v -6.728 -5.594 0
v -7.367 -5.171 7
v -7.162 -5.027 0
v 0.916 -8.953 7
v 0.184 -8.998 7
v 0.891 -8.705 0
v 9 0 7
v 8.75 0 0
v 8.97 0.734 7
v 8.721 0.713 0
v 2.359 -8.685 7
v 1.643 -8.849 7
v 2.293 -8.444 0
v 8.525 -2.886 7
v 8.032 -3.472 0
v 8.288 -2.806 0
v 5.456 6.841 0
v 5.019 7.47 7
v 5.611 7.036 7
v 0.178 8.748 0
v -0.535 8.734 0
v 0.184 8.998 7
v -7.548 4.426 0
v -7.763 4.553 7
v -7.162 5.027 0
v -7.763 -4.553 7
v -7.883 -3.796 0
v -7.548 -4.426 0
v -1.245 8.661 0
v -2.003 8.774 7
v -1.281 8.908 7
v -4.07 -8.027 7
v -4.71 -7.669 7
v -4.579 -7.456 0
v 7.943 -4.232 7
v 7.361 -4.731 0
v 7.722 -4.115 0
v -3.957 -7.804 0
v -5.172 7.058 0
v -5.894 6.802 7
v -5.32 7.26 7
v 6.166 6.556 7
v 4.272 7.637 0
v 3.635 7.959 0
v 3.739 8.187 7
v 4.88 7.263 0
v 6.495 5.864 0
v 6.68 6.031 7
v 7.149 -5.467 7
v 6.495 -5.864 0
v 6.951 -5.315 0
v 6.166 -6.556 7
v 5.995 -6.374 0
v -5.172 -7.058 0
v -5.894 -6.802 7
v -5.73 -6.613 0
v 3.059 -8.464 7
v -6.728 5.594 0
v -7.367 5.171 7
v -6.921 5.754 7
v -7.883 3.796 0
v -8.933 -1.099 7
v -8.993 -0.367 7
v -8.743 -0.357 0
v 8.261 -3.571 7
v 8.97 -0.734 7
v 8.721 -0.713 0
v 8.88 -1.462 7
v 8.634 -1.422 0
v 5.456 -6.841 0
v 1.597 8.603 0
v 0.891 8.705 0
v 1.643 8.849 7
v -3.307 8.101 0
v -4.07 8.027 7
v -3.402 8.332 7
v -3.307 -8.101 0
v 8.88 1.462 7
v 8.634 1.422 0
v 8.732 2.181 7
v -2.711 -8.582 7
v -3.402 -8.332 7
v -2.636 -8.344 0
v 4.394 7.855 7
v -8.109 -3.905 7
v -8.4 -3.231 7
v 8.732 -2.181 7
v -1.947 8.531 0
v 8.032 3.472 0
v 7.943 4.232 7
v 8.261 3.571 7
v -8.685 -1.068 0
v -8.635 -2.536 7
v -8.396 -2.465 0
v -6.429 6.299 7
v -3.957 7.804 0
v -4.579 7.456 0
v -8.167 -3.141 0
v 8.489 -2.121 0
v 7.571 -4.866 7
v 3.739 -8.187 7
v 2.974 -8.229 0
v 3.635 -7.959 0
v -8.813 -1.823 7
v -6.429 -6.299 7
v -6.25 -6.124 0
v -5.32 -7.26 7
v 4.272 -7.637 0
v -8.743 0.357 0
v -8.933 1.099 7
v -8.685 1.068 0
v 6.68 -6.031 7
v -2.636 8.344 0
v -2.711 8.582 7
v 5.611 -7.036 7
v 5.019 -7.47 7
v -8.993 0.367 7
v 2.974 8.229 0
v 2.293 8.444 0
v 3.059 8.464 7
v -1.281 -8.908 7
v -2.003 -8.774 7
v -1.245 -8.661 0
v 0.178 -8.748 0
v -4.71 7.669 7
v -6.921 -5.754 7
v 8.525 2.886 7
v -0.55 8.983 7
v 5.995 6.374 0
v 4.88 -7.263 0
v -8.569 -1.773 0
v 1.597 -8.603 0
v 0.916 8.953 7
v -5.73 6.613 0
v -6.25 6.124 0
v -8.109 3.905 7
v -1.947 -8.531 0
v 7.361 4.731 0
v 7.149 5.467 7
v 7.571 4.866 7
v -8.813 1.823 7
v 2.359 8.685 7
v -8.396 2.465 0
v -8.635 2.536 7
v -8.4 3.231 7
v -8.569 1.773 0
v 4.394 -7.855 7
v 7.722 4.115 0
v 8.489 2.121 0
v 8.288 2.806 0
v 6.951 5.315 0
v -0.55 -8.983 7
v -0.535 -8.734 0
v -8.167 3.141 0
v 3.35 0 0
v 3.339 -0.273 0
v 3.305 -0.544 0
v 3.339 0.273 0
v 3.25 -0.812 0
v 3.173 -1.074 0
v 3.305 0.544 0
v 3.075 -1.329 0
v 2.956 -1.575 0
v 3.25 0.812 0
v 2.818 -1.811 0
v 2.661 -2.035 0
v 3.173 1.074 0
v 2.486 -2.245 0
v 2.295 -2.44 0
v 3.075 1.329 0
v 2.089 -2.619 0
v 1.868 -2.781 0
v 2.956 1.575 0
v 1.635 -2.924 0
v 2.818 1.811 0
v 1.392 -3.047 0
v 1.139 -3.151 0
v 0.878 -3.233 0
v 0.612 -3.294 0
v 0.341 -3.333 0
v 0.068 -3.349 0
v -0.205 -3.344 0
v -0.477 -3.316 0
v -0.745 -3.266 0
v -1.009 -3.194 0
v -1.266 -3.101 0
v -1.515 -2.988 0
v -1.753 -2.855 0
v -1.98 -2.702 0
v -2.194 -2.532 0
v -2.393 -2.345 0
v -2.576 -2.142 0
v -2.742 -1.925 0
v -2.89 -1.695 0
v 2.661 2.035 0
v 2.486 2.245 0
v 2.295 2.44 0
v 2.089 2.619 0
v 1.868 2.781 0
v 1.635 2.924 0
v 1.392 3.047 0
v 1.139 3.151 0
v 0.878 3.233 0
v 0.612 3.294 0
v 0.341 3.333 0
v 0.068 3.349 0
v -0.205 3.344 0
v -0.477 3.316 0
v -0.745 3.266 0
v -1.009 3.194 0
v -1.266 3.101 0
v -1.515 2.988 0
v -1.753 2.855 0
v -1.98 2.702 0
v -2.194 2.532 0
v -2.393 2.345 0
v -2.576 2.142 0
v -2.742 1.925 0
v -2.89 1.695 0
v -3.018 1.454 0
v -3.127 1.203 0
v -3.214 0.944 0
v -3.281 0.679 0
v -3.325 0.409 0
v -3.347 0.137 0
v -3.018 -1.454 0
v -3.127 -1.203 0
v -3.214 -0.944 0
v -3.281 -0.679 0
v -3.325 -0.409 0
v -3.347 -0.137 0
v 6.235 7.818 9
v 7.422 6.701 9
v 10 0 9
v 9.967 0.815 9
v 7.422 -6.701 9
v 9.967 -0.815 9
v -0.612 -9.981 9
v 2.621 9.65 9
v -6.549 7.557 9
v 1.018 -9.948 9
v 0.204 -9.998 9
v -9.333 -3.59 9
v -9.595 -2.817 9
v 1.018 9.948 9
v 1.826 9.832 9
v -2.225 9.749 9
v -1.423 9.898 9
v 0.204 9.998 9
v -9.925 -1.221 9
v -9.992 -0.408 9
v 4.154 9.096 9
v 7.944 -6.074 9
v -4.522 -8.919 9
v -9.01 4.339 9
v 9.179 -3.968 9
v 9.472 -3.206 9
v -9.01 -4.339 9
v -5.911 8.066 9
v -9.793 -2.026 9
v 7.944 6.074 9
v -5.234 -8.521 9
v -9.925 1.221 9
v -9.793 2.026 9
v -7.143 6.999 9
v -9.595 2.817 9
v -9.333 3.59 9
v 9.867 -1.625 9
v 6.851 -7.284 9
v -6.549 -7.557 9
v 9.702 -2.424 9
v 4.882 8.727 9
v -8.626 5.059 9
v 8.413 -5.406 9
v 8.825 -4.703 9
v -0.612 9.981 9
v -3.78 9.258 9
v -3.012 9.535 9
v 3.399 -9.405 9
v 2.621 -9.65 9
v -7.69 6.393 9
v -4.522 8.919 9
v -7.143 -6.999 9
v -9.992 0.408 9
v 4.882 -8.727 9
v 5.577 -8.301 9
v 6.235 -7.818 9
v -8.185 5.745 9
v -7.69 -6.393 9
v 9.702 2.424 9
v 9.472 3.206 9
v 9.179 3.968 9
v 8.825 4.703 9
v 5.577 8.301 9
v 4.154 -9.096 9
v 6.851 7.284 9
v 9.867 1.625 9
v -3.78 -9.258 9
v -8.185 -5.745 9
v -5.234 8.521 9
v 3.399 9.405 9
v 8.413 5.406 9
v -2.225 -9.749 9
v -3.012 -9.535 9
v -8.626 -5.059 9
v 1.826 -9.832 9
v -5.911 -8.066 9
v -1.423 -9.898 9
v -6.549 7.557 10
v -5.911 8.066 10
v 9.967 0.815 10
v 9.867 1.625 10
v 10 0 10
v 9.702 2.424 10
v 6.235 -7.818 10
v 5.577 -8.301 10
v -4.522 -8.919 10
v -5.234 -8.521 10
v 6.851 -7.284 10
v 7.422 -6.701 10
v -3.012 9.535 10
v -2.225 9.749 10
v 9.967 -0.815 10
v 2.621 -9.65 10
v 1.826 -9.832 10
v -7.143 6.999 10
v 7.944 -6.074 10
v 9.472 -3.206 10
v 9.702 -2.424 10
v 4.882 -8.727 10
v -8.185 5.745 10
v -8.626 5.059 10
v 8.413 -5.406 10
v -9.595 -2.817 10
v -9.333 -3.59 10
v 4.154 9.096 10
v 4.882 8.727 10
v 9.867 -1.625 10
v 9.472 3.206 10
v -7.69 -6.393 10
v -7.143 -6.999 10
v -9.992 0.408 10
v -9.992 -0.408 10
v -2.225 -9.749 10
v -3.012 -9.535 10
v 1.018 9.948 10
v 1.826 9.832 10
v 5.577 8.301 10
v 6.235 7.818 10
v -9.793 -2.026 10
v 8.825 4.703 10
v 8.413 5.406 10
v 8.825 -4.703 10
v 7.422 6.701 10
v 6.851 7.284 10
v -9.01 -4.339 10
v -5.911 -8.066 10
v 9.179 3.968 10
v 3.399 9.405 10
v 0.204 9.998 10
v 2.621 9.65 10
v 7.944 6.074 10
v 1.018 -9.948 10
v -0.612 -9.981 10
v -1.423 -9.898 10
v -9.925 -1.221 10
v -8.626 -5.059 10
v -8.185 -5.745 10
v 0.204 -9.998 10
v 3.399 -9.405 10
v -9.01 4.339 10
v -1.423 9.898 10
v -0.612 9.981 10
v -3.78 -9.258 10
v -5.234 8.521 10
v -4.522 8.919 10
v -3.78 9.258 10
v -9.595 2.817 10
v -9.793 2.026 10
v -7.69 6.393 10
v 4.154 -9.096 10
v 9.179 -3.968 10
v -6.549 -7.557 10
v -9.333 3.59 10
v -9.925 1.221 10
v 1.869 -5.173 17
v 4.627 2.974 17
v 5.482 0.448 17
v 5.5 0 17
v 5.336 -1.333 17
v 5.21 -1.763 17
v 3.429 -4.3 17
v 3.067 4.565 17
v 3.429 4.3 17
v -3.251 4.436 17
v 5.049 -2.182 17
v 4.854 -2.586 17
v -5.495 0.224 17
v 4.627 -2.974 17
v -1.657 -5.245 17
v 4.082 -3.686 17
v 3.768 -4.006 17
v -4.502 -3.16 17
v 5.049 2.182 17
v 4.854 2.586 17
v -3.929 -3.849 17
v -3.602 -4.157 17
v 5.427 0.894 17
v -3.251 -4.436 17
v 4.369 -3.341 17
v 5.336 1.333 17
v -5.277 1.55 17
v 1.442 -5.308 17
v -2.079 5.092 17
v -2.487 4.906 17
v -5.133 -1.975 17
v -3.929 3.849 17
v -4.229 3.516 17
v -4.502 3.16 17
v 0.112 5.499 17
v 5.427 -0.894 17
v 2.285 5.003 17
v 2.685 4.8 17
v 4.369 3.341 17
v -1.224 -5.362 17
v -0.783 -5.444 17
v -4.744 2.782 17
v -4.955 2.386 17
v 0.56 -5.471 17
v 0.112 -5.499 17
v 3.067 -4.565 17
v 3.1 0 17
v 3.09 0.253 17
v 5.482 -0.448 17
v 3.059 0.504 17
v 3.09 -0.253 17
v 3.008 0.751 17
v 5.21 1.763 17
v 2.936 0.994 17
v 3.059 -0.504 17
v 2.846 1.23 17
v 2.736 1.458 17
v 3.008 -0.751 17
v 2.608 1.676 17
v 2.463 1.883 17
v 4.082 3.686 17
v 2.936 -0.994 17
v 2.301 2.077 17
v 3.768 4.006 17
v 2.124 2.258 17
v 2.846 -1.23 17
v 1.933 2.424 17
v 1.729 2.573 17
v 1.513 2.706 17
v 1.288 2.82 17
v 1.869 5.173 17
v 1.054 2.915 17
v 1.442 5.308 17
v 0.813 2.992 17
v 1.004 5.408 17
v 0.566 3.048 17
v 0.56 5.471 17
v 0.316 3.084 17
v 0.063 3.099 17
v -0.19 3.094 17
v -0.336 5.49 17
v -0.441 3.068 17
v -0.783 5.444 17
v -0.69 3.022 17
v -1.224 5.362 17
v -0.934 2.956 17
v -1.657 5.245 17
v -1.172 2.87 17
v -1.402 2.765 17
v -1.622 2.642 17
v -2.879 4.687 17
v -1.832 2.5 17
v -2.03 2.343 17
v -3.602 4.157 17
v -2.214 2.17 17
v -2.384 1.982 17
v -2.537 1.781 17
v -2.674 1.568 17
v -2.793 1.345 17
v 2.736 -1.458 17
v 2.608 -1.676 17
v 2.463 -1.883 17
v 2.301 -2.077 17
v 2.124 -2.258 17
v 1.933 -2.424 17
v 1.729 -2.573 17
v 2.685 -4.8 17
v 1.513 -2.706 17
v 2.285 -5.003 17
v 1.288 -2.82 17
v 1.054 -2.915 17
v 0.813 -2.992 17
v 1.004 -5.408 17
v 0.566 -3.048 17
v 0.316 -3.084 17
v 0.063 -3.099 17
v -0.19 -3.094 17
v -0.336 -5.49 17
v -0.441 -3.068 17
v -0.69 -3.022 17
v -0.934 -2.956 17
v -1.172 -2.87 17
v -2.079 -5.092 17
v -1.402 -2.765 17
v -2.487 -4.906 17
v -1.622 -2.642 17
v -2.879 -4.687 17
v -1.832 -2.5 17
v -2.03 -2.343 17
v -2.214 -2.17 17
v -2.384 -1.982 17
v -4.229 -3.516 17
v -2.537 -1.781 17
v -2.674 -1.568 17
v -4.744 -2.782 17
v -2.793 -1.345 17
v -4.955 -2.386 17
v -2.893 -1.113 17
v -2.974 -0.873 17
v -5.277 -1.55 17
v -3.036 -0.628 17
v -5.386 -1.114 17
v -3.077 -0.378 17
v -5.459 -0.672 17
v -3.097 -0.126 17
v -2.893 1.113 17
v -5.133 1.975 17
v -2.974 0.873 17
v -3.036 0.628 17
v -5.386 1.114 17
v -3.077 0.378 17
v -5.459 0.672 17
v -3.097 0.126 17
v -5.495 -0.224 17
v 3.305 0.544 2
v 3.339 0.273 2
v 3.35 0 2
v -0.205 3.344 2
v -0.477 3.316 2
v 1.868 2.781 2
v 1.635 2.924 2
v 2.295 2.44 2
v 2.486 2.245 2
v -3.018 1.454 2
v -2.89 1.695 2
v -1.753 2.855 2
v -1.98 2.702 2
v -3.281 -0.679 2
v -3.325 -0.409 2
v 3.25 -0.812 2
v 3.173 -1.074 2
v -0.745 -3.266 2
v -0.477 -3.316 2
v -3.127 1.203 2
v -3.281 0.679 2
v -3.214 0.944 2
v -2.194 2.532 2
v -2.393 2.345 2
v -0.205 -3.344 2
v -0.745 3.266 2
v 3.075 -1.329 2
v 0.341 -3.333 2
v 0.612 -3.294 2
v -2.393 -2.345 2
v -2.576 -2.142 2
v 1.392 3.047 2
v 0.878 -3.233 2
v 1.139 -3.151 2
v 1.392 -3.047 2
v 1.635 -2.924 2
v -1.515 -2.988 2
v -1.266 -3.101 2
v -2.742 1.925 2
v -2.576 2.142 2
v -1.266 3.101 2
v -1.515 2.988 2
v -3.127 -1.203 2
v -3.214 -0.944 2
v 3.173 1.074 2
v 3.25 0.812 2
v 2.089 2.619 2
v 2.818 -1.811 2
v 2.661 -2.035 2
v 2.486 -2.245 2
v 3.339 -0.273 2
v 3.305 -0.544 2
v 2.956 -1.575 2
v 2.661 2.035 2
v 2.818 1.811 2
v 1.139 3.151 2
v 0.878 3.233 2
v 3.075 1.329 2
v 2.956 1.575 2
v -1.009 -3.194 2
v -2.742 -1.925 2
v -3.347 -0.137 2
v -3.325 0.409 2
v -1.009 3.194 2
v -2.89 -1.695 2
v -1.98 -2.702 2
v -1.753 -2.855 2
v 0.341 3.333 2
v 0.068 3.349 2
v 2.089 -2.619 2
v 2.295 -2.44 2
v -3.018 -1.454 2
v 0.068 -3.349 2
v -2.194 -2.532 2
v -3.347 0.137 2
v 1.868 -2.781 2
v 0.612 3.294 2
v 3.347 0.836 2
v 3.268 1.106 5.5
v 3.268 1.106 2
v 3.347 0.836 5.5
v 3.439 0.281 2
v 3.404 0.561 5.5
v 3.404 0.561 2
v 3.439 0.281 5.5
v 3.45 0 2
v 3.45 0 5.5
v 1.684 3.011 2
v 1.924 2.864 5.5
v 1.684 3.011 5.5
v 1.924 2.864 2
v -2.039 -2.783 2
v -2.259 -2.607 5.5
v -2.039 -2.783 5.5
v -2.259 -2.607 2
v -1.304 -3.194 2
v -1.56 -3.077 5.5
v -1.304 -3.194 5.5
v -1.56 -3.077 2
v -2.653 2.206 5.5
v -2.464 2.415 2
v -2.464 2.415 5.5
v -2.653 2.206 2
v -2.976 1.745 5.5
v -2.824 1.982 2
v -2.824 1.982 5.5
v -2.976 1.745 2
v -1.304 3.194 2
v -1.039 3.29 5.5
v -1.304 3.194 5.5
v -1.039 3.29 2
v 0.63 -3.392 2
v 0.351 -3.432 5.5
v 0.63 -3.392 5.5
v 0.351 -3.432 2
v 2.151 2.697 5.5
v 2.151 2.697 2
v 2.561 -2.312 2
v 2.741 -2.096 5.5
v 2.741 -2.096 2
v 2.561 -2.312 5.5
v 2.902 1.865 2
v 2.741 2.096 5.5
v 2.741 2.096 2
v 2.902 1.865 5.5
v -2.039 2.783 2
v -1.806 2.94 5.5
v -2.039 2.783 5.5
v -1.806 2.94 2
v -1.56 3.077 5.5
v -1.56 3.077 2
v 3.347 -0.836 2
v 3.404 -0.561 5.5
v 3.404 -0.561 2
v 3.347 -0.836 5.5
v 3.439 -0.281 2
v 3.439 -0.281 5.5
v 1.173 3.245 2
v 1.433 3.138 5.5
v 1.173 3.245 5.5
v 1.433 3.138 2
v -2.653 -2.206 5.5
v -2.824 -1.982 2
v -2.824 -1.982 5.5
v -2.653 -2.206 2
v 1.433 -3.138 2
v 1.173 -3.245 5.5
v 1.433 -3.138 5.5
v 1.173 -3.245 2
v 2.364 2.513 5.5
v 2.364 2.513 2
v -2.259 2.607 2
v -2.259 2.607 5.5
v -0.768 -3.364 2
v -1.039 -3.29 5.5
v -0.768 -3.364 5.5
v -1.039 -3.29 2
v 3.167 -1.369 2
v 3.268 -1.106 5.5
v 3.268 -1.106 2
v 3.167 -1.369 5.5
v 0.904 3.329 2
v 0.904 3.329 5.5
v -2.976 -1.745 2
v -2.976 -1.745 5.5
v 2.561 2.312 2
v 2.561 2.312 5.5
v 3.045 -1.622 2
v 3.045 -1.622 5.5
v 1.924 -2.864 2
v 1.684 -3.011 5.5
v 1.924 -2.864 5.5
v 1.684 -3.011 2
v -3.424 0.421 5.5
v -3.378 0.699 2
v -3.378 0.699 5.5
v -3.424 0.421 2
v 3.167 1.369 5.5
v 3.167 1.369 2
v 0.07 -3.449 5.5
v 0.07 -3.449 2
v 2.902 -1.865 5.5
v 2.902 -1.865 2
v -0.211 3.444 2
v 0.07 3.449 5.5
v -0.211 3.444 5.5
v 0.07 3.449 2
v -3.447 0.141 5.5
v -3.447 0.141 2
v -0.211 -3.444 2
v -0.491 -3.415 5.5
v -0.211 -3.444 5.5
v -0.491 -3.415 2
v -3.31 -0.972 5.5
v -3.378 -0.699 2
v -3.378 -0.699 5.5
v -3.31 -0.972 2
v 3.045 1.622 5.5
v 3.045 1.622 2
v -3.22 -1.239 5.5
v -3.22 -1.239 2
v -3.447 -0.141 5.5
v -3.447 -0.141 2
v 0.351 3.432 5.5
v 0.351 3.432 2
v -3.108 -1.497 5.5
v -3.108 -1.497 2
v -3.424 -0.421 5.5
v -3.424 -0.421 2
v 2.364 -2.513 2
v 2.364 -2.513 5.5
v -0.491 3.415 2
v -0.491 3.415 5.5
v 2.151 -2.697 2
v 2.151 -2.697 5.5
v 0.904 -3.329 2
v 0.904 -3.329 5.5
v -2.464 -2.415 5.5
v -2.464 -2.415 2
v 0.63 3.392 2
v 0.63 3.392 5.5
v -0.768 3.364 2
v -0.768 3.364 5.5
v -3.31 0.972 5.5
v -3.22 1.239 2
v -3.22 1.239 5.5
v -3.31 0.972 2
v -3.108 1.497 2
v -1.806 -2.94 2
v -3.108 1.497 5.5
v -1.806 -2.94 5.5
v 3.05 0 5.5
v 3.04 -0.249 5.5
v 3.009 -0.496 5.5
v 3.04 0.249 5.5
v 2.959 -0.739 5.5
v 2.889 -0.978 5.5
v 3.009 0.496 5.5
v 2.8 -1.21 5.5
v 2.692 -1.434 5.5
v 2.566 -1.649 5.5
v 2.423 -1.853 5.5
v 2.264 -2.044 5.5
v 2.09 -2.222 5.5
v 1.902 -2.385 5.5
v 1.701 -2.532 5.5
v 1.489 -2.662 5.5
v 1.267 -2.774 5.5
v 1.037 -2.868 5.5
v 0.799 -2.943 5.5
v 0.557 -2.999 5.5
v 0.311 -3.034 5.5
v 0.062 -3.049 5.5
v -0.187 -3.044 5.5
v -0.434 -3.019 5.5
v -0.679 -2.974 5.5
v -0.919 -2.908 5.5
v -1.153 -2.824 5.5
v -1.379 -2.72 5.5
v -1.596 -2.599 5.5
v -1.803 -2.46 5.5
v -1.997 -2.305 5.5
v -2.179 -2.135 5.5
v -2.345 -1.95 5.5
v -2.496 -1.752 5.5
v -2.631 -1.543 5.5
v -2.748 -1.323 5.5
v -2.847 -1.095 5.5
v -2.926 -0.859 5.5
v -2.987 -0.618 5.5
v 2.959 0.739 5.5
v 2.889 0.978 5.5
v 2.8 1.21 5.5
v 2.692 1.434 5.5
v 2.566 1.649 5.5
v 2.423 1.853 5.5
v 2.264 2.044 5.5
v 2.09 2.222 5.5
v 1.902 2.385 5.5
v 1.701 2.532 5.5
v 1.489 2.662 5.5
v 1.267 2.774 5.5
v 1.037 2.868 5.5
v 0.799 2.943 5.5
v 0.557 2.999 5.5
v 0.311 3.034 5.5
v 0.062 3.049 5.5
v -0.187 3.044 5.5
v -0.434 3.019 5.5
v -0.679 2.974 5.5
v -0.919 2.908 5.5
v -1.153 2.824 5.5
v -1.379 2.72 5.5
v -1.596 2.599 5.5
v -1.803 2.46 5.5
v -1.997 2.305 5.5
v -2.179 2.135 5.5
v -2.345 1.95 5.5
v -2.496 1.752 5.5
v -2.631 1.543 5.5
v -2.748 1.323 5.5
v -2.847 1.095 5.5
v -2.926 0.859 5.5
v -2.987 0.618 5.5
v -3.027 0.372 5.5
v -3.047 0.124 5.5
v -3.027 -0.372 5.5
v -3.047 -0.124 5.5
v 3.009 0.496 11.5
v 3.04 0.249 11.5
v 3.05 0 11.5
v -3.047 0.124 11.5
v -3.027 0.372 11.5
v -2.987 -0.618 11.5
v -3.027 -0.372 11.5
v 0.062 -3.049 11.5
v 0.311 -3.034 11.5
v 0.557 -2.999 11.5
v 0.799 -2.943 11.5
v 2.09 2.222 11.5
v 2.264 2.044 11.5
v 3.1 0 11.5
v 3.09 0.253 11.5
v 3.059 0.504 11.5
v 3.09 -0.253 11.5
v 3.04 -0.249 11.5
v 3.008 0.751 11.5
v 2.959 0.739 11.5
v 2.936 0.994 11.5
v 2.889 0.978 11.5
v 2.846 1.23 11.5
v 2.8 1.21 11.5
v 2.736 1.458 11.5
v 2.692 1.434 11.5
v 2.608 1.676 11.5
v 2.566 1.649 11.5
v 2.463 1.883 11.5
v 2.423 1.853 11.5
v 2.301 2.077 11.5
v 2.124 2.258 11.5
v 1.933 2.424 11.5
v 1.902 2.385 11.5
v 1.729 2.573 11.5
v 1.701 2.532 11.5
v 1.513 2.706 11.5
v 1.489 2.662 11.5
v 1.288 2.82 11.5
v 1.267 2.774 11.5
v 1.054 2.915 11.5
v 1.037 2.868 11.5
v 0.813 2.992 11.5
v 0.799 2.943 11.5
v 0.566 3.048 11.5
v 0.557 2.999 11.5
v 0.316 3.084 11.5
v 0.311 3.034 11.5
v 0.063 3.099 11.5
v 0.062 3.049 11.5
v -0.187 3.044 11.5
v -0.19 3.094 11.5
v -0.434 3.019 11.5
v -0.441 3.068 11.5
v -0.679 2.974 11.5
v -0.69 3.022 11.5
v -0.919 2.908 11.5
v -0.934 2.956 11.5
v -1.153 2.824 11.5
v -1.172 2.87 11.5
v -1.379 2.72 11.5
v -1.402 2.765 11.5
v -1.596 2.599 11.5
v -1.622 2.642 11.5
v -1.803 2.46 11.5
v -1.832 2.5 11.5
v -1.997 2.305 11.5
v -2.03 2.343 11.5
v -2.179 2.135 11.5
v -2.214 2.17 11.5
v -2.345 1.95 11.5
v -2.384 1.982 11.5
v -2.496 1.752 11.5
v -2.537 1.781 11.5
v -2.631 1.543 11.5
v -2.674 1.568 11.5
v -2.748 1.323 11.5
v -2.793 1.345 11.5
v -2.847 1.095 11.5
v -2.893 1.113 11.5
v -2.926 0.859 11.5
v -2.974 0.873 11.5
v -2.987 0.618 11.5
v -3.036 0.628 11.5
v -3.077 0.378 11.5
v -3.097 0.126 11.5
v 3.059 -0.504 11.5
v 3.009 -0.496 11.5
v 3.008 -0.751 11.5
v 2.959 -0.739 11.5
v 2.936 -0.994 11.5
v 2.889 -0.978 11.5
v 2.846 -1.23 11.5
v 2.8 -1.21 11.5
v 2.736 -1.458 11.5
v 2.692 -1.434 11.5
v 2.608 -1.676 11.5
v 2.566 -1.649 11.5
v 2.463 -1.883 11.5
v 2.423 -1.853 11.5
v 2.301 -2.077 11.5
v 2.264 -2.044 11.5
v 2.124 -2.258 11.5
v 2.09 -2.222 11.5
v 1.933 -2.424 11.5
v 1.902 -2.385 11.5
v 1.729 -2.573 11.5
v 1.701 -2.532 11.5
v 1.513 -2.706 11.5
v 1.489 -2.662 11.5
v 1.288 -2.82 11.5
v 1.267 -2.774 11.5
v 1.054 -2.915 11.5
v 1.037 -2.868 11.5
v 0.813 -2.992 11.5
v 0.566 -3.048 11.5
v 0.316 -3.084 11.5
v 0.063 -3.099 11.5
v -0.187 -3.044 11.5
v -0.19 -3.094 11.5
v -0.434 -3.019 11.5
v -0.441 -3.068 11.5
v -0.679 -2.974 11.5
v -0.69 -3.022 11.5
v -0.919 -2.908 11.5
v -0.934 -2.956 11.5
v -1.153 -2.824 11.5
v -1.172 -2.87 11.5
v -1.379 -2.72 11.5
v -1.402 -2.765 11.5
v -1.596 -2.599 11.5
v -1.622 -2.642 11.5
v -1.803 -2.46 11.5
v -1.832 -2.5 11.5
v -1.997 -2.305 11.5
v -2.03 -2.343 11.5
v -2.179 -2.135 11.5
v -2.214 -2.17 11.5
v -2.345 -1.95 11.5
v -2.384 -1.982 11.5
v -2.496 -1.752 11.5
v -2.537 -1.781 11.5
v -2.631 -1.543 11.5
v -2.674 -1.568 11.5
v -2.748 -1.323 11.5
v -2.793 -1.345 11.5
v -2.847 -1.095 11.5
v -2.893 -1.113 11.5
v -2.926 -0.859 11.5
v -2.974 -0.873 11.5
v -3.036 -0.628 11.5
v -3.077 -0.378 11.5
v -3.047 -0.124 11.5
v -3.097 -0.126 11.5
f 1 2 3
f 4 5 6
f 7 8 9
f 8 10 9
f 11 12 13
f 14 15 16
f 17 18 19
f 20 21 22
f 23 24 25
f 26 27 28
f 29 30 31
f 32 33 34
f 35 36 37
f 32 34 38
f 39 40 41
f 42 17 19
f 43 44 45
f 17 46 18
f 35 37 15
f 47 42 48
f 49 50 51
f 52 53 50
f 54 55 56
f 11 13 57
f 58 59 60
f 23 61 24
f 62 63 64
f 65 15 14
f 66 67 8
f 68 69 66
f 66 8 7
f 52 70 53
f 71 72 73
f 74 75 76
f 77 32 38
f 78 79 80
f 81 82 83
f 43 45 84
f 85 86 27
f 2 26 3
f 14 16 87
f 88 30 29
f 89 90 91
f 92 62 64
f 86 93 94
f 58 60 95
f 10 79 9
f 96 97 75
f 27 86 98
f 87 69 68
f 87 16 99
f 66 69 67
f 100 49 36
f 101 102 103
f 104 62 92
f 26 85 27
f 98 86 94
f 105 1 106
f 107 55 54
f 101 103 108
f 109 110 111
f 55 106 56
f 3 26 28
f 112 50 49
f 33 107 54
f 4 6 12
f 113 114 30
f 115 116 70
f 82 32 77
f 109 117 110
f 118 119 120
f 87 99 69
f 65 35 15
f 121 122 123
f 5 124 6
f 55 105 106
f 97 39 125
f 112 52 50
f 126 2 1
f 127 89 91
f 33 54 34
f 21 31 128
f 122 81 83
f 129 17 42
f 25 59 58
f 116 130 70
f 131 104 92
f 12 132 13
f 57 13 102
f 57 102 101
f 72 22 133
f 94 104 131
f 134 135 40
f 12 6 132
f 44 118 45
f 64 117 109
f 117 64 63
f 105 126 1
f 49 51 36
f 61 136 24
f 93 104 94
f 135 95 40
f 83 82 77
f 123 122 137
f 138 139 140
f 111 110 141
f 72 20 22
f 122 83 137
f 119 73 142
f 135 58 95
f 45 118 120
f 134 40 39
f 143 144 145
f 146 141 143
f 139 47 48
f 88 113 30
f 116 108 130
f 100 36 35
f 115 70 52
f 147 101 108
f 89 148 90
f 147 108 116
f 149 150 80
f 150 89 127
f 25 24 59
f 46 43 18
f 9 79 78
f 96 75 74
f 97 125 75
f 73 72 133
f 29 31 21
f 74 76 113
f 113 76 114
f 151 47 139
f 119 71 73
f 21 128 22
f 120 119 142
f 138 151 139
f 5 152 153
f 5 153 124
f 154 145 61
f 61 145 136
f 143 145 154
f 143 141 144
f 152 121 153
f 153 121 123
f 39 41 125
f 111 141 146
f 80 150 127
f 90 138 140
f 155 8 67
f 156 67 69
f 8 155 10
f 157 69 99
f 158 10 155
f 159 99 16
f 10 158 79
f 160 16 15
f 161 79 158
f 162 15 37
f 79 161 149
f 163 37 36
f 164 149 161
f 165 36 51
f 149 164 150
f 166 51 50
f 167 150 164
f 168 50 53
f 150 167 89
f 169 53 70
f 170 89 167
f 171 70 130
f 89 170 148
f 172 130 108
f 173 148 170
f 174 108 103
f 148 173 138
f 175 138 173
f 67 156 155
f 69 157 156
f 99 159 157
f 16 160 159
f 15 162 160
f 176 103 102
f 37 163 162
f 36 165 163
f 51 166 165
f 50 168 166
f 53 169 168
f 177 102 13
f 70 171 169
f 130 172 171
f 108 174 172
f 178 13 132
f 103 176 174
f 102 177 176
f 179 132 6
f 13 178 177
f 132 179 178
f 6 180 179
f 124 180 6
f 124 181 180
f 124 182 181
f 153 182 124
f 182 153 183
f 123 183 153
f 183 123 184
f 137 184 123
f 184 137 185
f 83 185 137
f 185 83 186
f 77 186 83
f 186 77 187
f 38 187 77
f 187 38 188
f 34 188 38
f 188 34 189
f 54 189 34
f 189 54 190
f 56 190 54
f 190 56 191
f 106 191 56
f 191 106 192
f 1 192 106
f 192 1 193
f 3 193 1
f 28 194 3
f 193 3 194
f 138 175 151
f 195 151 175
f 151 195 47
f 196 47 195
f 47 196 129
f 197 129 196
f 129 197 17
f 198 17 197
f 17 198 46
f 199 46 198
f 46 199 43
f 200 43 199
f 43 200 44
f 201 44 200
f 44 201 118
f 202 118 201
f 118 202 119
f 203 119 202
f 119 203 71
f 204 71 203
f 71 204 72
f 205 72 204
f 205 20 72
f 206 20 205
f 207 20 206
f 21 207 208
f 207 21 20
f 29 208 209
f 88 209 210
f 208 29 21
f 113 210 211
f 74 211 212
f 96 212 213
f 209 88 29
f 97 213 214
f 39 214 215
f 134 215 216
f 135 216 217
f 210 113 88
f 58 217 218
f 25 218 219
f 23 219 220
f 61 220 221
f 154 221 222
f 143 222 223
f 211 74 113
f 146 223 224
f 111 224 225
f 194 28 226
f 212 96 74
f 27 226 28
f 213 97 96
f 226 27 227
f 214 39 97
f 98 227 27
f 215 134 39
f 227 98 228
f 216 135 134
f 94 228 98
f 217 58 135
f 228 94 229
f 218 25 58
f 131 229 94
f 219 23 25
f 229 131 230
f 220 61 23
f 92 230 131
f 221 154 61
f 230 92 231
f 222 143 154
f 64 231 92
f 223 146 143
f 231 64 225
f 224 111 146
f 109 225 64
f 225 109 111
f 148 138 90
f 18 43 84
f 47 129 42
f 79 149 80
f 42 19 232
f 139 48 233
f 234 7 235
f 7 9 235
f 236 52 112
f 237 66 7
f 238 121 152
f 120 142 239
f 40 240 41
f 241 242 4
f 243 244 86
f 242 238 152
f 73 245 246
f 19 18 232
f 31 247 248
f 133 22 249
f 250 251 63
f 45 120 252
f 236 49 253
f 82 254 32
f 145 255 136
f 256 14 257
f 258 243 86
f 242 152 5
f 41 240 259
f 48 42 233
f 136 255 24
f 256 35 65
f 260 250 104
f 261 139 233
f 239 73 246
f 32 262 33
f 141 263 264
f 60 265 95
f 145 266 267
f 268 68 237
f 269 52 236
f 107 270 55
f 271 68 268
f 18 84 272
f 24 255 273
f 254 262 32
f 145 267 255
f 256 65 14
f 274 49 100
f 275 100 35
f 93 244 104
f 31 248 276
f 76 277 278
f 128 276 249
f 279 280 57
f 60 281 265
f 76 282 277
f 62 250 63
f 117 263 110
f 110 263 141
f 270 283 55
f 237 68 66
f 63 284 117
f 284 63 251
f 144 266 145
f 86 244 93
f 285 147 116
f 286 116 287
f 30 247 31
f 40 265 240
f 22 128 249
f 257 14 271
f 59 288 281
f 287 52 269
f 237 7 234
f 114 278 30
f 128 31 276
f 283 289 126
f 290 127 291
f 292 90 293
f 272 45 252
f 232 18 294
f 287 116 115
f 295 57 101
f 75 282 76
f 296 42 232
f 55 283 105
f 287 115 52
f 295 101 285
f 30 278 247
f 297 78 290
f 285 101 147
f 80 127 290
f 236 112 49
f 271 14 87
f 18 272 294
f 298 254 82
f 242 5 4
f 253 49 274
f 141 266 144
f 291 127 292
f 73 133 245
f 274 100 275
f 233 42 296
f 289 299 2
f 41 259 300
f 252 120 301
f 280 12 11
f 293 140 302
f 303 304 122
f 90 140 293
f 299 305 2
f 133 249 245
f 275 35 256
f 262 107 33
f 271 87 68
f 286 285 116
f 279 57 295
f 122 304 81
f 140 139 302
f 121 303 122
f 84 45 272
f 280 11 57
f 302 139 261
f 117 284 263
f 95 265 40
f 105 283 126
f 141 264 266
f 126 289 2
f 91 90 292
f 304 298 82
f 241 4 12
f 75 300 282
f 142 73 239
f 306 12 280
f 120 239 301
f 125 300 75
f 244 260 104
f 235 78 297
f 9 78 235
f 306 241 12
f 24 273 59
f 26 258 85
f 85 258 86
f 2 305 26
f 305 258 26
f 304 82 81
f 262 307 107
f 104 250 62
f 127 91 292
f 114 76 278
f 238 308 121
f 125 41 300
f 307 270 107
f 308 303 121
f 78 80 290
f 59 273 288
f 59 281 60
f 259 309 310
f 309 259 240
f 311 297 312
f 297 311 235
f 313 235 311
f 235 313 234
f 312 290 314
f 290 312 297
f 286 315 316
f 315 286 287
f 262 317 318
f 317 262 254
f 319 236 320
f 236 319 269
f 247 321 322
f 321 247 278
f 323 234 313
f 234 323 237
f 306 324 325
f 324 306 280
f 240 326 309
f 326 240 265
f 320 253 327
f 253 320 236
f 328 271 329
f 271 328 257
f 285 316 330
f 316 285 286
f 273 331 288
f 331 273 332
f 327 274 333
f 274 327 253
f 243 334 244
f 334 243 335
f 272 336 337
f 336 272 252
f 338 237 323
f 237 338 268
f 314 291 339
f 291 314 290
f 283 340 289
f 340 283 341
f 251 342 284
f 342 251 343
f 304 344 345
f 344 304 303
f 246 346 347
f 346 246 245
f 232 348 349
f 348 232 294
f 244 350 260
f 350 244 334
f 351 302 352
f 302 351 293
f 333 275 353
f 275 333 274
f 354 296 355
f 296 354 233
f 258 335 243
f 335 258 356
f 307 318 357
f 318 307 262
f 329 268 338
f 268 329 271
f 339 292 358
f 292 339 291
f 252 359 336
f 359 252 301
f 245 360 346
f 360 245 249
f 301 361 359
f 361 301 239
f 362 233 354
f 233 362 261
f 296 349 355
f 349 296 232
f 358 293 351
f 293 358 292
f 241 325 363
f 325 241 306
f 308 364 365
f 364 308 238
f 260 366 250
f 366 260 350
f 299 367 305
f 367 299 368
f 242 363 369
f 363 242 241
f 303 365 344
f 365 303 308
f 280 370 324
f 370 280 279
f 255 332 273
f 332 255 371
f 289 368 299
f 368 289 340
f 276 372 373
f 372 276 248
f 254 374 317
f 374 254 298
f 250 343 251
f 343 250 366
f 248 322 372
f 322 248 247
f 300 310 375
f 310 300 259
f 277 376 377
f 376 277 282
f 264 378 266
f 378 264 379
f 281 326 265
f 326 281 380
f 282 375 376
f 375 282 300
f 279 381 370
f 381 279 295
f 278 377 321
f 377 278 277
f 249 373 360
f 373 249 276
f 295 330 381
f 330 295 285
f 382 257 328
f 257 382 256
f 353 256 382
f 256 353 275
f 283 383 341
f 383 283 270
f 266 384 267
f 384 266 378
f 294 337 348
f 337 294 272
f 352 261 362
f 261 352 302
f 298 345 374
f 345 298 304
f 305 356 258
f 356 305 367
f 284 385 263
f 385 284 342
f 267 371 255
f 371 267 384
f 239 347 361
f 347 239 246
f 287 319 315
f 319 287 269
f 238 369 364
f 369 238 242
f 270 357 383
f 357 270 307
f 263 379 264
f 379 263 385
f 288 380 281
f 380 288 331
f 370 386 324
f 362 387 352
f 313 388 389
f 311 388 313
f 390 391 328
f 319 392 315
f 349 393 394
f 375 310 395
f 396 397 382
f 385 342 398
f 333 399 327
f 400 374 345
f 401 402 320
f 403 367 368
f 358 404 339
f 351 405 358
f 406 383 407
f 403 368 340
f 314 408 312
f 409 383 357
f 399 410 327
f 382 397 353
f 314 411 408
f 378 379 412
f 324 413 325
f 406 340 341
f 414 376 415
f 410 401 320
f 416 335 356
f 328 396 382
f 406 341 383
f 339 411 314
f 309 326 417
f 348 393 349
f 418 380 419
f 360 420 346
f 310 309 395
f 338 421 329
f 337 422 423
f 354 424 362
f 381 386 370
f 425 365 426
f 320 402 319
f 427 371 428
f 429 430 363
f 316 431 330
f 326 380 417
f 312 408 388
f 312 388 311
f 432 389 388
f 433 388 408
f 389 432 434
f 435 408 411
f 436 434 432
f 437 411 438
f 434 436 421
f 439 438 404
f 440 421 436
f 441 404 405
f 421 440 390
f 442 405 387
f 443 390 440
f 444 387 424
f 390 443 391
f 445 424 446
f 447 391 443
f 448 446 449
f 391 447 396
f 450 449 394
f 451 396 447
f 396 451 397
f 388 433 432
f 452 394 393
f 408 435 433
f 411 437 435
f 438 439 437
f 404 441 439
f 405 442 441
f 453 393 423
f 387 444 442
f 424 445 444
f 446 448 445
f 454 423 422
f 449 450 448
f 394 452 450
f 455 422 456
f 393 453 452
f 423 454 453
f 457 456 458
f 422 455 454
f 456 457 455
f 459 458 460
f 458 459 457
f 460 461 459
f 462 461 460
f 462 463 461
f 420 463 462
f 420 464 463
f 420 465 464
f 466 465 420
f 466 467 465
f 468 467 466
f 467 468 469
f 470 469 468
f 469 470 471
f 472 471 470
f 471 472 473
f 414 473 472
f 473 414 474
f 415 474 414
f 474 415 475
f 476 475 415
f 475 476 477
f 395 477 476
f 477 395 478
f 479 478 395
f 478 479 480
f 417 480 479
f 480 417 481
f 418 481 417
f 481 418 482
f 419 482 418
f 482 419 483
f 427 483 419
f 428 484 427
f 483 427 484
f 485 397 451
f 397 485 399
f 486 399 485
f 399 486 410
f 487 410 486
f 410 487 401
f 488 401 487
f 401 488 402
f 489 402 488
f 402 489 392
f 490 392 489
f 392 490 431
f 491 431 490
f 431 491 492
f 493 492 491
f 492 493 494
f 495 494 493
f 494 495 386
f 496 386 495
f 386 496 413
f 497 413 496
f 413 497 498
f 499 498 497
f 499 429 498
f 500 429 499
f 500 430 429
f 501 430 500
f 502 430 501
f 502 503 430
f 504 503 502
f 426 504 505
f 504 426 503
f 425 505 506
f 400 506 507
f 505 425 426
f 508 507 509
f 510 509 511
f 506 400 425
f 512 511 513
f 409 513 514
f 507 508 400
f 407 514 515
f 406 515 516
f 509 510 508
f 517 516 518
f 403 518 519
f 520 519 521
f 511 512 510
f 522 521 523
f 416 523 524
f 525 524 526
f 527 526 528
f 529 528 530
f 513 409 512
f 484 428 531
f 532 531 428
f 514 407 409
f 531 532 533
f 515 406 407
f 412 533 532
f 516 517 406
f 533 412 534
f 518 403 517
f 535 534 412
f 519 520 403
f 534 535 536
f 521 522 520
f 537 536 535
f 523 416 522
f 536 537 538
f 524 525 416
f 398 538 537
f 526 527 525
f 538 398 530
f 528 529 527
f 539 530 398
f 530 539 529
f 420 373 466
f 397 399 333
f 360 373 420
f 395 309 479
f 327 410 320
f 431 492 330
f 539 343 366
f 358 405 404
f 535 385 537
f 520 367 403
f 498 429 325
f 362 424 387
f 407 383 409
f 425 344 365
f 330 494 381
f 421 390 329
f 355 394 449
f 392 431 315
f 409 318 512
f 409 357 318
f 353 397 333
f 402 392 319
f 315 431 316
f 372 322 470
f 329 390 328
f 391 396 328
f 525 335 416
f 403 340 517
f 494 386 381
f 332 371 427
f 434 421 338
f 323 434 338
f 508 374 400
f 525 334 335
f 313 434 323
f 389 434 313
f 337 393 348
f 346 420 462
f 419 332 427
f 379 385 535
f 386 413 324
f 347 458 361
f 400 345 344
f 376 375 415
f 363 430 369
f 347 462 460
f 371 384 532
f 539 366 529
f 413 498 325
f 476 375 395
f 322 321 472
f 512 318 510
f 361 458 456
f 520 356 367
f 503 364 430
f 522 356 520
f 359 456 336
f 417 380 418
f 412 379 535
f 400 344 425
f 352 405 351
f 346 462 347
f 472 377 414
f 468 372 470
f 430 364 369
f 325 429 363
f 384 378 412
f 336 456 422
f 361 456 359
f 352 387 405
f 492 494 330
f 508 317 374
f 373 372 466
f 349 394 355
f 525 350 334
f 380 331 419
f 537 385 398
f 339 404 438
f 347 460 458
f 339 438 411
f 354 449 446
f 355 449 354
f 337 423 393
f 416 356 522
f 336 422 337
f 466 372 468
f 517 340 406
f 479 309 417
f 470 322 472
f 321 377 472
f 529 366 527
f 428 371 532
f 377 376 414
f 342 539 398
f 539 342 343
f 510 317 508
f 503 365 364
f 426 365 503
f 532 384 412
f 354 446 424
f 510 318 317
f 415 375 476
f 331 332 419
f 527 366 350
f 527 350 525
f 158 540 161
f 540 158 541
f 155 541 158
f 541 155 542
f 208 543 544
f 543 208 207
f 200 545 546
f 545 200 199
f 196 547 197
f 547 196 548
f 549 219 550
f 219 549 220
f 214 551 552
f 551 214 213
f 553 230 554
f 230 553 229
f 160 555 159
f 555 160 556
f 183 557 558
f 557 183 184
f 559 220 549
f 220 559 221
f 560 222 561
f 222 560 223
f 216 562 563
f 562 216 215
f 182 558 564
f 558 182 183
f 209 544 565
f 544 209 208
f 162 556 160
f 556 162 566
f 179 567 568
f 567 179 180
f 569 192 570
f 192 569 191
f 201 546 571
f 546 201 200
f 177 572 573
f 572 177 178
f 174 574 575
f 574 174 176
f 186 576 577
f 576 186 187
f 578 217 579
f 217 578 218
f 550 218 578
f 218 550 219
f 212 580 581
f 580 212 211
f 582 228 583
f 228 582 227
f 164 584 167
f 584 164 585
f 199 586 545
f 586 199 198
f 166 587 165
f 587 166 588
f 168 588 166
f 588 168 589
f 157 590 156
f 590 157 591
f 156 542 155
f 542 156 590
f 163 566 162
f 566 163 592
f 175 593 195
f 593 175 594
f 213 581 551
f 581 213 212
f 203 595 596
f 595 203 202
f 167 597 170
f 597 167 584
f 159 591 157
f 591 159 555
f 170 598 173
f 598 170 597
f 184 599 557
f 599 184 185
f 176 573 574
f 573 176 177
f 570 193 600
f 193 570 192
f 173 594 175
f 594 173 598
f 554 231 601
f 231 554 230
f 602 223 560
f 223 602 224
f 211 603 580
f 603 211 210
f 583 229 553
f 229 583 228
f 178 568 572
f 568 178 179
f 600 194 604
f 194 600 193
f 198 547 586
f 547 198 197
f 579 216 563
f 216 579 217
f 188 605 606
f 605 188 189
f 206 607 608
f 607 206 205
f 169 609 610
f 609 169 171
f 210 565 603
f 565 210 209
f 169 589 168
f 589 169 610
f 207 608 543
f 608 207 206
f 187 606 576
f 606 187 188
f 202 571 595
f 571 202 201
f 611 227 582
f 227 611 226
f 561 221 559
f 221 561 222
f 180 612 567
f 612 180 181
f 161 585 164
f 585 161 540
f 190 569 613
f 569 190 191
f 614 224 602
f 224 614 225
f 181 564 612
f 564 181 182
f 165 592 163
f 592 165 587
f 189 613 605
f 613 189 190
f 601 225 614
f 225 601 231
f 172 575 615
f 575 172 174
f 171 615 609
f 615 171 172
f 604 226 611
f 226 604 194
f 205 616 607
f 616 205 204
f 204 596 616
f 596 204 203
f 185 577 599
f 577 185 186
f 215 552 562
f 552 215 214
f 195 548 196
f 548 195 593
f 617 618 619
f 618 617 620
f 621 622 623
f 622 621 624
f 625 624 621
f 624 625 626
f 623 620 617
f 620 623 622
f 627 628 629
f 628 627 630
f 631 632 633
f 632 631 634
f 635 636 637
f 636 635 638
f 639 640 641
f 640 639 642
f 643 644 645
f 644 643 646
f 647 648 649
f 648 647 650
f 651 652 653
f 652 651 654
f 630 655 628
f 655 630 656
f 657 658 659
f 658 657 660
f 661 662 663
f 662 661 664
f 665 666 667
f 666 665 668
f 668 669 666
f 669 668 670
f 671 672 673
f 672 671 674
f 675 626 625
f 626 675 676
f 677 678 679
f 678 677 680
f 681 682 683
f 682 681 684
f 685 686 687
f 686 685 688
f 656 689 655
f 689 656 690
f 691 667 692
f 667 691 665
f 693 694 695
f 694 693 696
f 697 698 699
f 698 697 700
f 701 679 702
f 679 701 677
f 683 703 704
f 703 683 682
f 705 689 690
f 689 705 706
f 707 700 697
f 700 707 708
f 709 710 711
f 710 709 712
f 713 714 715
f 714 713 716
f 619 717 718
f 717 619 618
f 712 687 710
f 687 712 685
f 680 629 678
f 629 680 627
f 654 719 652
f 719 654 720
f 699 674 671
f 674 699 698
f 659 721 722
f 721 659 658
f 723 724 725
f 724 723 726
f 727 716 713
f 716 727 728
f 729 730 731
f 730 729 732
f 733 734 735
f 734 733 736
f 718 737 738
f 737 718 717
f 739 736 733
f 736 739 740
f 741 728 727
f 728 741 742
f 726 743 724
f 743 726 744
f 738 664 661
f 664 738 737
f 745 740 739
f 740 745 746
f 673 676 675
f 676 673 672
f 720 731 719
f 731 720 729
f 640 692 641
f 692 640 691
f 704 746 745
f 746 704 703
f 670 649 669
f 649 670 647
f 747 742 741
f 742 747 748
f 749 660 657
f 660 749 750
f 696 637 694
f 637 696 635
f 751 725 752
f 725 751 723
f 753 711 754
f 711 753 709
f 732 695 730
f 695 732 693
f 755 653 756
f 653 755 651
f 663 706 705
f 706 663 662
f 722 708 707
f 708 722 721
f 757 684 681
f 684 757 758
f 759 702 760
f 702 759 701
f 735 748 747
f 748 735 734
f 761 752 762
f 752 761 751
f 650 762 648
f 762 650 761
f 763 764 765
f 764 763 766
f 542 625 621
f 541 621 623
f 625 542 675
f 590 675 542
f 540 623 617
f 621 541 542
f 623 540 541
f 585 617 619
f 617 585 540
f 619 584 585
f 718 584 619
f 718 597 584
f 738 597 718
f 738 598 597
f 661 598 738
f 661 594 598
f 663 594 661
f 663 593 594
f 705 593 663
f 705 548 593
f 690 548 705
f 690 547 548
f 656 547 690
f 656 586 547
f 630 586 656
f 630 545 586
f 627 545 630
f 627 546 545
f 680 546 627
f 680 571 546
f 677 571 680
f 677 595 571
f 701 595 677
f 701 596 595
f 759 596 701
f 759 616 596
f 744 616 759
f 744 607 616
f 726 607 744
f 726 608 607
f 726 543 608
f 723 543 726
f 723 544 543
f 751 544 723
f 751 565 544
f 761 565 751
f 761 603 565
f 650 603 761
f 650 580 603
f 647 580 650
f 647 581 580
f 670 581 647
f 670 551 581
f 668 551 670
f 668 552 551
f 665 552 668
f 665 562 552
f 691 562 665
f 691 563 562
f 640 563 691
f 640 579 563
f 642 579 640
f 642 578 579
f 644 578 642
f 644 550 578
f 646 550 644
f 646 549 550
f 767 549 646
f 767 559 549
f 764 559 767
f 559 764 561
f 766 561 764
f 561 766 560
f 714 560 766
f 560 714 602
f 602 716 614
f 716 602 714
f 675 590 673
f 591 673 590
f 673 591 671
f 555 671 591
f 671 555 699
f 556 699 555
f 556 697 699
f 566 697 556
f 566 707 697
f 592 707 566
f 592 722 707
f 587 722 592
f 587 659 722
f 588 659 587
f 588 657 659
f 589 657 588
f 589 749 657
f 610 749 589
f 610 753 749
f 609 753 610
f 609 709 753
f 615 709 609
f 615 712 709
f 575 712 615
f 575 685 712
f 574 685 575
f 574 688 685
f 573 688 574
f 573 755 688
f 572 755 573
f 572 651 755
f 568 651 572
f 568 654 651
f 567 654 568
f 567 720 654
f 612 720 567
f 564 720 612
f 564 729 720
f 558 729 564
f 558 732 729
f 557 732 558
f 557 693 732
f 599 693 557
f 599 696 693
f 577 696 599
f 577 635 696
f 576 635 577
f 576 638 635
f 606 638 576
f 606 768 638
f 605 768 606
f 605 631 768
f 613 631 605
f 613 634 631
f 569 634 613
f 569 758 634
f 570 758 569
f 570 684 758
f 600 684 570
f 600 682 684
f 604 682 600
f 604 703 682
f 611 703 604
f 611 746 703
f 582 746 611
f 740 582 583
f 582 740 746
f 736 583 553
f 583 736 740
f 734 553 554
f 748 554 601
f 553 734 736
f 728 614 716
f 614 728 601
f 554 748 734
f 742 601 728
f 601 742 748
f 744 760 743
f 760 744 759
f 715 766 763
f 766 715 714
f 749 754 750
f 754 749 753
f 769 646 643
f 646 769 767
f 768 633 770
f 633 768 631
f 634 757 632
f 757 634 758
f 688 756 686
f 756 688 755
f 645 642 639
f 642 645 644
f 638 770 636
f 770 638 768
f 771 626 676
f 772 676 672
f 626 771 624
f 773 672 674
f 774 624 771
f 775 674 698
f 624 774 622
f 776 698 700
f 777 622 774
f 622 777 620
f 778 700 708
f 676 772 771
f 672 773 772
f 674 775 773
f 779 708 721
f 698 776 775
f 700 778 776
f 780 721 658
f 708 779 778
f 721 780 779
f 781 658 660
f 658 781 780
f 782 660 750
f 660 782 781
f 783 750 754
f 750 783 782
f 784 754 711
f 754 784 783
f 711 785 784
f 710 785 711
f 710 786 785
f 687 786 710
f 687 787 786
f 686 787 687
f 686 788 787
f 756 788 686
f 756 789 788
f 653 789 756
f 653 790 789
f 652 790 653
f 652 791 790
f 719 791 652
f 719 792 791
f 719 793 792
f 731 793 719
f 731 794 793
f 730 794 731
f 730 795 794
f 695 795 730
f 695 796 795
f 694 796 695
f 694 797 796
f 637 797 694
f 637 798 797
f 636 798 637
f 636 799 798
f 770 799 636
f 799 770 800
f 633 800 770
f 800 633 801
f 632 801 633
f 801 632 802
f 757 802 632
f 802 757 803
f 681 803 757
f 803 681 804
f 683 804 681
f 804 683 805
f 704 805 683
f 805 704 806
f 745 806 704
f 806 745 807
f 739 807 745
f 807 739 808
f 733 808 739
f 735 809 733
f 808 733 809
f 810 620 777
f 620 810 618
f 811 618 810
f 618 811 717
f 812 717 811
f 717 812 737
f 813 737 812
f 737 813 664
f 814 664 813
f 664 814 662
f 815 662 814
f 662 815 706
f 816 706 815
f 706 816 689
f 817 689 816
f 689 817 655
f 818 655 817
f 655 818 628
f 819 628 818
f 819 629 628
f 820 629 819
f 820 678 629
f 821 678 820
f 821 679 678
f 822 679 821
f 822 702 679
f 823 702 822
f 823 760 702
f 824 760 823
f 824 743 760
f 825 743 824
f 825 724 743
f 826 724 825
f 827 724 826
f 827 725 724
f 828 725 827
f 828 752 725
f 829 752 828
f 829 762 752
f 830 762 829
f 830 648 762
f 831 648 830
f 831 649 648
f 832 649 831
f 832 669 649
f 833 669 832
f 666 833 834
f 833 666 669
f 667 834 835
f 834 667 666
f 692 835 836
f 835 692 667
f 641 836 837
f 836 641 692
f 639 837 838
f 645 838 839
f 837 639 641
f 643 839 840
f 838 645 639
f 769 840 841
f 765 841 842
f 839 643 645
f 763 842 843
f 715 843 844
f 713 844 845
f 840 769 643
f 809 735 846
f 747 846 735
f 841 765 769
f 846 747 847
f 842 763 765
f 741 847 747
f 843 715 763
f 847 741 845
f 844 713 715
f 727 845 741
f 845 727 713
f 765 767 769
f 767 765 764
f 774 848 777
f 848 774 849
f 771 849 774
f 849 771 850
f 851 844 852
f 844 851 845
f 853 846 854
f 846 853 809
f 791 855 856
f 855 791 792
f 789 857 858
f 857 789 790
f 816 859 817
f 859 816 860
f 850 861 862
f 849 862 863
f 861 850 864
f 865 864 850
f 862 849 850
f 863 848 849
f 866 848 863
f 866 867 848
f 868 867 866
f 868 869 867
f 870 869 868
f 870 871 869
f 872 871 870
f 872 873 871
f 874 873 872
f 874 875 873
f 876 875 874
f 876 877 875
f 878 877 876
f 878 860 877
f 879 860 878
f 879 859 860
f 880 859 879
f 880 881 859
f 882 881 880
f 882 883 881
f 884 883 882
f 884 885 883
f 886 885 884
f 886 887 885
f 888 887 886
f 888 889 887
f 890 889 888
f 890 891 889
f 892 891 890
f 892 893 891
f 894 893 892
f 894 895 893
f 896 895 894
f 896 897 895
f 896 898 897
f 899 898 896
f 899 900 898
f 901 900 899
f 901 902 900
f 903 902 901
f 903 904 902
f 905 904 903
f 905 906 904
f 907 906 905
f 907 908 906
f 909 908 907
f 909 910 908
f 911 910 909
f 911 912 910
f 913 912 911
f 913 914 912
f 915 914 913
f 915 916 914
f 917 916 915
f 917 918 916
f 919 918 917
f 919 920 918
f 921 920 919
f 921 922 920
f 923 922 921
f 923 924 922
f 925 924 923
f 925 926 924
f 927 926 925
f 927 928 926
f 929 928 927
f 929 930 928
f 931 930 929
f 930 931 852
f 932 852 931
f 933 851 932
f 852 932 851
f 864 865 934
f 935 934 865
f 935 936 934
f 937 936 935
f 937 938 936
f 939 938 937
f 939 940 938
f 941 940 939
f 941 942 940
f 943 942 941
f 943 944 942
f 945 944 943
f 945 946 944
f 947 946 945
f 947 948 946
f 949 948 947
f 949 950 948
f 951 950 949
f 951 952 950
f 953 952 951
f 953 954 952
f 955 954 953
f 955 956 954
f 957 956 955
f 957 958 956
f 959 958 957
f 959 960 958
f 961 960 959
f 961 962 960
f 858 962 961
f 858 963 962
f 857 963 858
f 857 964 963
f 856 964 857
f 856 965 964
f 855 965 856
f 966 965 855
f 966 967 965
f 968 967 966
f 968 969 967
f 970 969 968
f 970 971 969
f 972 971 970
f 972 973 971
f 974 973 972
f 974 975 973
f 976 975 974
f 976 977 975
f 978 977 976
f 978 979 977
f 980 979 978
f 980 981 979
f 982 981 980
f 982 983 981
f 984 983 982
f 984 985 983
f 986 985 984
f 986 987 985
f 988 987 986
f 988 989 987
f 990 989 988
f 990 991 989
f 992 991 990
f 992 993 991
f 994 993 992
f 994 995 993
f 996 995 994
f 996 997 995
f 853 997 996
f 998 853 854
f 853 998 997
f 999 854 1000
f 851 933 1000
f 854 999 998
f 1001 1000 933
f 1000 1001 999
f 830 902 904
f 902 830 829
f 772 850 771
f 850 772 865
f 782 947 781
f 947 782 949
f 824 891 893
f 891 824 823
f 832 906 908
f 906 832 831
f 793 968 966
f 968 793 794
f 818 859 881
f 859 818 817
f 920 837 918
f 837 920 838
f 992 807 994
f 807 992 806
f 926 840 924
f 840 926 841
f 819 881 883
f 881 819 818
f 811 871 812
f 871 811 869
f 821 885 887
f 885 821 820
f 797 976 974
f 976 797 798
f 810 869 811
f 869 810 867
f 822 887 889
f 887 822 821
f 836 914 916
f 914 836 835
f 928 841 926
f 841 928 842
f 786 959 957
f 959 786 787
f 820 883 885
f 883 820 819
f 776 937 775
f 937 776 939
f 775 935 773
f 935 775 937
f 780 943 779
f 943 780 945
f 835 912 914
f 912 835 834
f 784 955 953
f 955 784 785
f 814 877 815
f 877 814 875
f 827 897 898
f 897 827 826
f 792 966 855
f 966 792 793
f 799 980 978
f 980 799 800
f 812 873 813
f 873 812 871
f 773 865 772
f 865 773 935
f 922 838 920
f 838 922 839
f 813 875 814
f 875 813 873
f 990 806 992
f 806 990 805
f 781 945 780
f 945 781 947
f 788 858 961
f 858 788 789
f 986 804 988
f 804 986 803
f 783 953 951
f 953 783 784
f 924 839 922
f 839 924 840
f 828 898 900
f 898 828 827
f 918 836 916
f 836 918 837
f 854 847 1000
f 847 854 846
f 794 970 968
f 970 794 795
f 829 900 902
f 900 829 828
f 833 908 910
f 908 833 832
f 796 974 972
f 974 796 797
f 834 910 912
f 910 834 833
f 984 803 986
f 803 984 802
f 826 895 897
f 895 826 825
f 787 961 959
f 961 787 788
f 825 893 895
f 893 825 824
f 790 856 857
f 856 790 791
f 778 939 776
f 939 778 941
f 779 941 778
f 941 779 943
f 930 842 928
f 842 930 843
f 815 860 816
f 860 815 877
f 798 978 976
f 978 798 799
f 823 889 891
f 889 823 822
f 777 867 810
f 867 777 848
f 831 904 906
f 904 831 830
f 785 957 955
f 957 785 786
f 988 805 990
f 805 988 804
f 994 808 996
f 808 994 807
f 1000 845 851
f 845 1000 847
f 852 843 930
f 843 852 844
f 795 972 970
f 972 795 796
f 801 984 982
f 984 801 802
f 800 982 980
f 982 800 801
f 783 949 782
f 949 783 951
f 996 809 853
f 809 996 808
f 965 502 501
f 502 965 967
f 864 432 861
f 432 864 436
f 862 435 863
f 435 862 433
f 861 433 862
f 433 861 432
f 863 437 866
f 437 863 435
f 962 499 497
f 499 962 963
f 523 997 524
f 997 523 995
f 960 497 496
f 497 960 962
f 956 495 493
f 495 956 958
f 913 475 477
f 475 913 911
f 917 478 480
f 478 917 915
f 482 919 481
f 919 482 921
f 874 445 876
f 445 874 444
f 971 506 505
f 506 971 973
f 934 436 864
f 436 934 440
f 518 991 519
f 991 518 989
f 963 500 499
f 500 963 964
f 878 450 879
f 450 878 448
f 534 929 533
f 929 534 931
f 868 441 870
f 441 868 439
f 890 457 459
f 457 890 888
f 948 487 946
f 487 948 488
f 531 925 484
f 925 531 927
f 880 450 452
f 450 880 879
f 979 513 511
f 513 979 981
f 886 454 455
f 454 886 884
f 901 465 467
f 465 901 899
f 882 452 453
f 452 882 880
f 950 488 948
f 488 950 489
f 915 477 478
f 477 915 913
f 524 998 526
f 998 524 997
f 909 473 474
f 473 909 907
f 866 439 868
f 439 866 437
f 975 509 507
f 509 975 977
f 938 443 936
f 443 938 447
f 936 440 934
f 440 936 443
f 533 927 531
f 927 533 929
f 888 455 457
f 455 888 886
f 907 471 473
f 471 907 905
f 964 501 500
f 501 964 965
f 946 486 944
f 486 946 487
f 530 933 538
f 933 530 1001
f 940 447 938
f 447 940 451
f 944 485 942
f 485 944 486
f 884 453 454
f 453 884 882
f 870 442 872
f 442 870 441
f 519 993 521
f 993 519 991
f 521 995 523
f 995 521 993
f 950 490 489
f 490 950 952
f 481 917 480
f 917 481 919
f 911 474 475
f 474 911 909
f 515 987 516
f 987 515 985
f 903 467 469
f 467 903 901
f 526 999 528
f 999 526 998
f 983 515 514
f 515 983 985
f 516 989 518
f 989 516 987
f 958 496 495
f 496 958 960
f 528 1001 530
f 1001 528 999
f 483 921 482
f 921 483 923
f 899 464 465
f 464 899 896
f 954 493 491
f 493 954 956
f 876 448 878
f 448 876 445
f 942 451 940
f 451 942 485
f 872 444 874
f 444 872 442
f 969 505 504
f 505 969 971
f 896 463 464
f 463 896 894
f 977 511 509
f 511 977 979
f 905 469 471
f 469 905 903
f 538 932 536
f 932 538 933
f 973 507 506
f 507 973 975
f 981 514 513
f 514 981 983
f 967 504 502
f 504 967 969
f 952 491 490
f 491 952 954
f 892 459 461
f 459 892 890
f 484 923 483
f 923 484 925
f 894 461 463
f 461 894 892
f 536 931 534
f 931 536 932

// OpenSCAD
// file: ../Parts/hexcut.scad
// hexcut

//--------------------------------
module hexcut1(
R=1,
x0=0,
y0=0,
h0=10,
N0=4
){
        
    for (i=[0:N0-1]){
        translate([x0,y0+i*R*2,-1])
        cylinder(r=R,h=h0,$fn=6);
    }
    for (i=[0:N0-2]){
        translate([x0-1.717*R,y0+R+i*R*2,-1])
        cylinder(r=R,h=h0,$fn=6);
    }
    for (i=[0:N0-2]){
        translate([x0+1.717*R,y0+R+i*R*2,-1])
        cylinder(r=R,h=h0,$fn=6);
    }

}


//=======================
    
hexcut1(R=1,x0=0,y0=0,h0=10,N0=4);
    
    
// file: ../Parts/rounder.scad
// rounder.scad
// cutting tool for rounding off corners with a cylinder

//---------------------
module rounder(
r=10,   // radius
h=10,   // height
f=22,    // $fn
extra=0.01  // extra size for the cube
){

difference(){
  translate([-extra,-extra,-extra])
  cube([r+extra,r+extra,h+2*extra]);
  translate([r,r,-1])
  cylinder(r=r,h=h+2,$fn=f);
}

}

//---------------------------------------------------------------------------
module bevel(x=1,y=1,h=10){

linear_extrude(height=h)
polygon(points=[[0,0],[x,0],[0,y]]);
    
}
  

//========================

rounder();

//========================
// main file
//======================================================================
// Desolder.scad
//
// Fix desoldering tool
//
// DrTomFlint, 3 March 2025
//======================================================================

use <../Parts/rounder.scad>
use <../Parts/hexcut.scad>


F1=299;
F2=77;

//----------------------------------------------------------------------
module plug(tol=0){

  difference(){
    union(){
      // insert
      translate([0,0,0])
      cylinder(r1=17.5/2,r2=18/2,h=7,$fn=F2);
      // lip
      translate([0,0,7])
      cylinder(r1=18/2,r2=20/2,h=2,$fn=F2);
      translate([0,0,9])
      cylinder(r=20/2,h=1,$fn=F2);
      translate([0,0,10])
      cylinder(r1=20/2,r2=11/2,h=7,$fn=F2);
    }
    
    translate([0,0,0])
    cylinder(r=6.7/2,h=3.5,$fn=F2);
    translate([0,0,2])
    cylinder(r=6.9/2,h=3.5,$fn=F2);
    translate([0,0,2+3.5])
    cylinder(r=6.1/2,h=6,$fn=F2);
    translate([0,0,2+3.5+6])
    cylinder(r=6.2/2,h=10,$fn=F2);
    
    
    // for cutaway view only
    //~ cube([40,40,20]);
  }

}


//======================================================================

plug();

//======================================================================
